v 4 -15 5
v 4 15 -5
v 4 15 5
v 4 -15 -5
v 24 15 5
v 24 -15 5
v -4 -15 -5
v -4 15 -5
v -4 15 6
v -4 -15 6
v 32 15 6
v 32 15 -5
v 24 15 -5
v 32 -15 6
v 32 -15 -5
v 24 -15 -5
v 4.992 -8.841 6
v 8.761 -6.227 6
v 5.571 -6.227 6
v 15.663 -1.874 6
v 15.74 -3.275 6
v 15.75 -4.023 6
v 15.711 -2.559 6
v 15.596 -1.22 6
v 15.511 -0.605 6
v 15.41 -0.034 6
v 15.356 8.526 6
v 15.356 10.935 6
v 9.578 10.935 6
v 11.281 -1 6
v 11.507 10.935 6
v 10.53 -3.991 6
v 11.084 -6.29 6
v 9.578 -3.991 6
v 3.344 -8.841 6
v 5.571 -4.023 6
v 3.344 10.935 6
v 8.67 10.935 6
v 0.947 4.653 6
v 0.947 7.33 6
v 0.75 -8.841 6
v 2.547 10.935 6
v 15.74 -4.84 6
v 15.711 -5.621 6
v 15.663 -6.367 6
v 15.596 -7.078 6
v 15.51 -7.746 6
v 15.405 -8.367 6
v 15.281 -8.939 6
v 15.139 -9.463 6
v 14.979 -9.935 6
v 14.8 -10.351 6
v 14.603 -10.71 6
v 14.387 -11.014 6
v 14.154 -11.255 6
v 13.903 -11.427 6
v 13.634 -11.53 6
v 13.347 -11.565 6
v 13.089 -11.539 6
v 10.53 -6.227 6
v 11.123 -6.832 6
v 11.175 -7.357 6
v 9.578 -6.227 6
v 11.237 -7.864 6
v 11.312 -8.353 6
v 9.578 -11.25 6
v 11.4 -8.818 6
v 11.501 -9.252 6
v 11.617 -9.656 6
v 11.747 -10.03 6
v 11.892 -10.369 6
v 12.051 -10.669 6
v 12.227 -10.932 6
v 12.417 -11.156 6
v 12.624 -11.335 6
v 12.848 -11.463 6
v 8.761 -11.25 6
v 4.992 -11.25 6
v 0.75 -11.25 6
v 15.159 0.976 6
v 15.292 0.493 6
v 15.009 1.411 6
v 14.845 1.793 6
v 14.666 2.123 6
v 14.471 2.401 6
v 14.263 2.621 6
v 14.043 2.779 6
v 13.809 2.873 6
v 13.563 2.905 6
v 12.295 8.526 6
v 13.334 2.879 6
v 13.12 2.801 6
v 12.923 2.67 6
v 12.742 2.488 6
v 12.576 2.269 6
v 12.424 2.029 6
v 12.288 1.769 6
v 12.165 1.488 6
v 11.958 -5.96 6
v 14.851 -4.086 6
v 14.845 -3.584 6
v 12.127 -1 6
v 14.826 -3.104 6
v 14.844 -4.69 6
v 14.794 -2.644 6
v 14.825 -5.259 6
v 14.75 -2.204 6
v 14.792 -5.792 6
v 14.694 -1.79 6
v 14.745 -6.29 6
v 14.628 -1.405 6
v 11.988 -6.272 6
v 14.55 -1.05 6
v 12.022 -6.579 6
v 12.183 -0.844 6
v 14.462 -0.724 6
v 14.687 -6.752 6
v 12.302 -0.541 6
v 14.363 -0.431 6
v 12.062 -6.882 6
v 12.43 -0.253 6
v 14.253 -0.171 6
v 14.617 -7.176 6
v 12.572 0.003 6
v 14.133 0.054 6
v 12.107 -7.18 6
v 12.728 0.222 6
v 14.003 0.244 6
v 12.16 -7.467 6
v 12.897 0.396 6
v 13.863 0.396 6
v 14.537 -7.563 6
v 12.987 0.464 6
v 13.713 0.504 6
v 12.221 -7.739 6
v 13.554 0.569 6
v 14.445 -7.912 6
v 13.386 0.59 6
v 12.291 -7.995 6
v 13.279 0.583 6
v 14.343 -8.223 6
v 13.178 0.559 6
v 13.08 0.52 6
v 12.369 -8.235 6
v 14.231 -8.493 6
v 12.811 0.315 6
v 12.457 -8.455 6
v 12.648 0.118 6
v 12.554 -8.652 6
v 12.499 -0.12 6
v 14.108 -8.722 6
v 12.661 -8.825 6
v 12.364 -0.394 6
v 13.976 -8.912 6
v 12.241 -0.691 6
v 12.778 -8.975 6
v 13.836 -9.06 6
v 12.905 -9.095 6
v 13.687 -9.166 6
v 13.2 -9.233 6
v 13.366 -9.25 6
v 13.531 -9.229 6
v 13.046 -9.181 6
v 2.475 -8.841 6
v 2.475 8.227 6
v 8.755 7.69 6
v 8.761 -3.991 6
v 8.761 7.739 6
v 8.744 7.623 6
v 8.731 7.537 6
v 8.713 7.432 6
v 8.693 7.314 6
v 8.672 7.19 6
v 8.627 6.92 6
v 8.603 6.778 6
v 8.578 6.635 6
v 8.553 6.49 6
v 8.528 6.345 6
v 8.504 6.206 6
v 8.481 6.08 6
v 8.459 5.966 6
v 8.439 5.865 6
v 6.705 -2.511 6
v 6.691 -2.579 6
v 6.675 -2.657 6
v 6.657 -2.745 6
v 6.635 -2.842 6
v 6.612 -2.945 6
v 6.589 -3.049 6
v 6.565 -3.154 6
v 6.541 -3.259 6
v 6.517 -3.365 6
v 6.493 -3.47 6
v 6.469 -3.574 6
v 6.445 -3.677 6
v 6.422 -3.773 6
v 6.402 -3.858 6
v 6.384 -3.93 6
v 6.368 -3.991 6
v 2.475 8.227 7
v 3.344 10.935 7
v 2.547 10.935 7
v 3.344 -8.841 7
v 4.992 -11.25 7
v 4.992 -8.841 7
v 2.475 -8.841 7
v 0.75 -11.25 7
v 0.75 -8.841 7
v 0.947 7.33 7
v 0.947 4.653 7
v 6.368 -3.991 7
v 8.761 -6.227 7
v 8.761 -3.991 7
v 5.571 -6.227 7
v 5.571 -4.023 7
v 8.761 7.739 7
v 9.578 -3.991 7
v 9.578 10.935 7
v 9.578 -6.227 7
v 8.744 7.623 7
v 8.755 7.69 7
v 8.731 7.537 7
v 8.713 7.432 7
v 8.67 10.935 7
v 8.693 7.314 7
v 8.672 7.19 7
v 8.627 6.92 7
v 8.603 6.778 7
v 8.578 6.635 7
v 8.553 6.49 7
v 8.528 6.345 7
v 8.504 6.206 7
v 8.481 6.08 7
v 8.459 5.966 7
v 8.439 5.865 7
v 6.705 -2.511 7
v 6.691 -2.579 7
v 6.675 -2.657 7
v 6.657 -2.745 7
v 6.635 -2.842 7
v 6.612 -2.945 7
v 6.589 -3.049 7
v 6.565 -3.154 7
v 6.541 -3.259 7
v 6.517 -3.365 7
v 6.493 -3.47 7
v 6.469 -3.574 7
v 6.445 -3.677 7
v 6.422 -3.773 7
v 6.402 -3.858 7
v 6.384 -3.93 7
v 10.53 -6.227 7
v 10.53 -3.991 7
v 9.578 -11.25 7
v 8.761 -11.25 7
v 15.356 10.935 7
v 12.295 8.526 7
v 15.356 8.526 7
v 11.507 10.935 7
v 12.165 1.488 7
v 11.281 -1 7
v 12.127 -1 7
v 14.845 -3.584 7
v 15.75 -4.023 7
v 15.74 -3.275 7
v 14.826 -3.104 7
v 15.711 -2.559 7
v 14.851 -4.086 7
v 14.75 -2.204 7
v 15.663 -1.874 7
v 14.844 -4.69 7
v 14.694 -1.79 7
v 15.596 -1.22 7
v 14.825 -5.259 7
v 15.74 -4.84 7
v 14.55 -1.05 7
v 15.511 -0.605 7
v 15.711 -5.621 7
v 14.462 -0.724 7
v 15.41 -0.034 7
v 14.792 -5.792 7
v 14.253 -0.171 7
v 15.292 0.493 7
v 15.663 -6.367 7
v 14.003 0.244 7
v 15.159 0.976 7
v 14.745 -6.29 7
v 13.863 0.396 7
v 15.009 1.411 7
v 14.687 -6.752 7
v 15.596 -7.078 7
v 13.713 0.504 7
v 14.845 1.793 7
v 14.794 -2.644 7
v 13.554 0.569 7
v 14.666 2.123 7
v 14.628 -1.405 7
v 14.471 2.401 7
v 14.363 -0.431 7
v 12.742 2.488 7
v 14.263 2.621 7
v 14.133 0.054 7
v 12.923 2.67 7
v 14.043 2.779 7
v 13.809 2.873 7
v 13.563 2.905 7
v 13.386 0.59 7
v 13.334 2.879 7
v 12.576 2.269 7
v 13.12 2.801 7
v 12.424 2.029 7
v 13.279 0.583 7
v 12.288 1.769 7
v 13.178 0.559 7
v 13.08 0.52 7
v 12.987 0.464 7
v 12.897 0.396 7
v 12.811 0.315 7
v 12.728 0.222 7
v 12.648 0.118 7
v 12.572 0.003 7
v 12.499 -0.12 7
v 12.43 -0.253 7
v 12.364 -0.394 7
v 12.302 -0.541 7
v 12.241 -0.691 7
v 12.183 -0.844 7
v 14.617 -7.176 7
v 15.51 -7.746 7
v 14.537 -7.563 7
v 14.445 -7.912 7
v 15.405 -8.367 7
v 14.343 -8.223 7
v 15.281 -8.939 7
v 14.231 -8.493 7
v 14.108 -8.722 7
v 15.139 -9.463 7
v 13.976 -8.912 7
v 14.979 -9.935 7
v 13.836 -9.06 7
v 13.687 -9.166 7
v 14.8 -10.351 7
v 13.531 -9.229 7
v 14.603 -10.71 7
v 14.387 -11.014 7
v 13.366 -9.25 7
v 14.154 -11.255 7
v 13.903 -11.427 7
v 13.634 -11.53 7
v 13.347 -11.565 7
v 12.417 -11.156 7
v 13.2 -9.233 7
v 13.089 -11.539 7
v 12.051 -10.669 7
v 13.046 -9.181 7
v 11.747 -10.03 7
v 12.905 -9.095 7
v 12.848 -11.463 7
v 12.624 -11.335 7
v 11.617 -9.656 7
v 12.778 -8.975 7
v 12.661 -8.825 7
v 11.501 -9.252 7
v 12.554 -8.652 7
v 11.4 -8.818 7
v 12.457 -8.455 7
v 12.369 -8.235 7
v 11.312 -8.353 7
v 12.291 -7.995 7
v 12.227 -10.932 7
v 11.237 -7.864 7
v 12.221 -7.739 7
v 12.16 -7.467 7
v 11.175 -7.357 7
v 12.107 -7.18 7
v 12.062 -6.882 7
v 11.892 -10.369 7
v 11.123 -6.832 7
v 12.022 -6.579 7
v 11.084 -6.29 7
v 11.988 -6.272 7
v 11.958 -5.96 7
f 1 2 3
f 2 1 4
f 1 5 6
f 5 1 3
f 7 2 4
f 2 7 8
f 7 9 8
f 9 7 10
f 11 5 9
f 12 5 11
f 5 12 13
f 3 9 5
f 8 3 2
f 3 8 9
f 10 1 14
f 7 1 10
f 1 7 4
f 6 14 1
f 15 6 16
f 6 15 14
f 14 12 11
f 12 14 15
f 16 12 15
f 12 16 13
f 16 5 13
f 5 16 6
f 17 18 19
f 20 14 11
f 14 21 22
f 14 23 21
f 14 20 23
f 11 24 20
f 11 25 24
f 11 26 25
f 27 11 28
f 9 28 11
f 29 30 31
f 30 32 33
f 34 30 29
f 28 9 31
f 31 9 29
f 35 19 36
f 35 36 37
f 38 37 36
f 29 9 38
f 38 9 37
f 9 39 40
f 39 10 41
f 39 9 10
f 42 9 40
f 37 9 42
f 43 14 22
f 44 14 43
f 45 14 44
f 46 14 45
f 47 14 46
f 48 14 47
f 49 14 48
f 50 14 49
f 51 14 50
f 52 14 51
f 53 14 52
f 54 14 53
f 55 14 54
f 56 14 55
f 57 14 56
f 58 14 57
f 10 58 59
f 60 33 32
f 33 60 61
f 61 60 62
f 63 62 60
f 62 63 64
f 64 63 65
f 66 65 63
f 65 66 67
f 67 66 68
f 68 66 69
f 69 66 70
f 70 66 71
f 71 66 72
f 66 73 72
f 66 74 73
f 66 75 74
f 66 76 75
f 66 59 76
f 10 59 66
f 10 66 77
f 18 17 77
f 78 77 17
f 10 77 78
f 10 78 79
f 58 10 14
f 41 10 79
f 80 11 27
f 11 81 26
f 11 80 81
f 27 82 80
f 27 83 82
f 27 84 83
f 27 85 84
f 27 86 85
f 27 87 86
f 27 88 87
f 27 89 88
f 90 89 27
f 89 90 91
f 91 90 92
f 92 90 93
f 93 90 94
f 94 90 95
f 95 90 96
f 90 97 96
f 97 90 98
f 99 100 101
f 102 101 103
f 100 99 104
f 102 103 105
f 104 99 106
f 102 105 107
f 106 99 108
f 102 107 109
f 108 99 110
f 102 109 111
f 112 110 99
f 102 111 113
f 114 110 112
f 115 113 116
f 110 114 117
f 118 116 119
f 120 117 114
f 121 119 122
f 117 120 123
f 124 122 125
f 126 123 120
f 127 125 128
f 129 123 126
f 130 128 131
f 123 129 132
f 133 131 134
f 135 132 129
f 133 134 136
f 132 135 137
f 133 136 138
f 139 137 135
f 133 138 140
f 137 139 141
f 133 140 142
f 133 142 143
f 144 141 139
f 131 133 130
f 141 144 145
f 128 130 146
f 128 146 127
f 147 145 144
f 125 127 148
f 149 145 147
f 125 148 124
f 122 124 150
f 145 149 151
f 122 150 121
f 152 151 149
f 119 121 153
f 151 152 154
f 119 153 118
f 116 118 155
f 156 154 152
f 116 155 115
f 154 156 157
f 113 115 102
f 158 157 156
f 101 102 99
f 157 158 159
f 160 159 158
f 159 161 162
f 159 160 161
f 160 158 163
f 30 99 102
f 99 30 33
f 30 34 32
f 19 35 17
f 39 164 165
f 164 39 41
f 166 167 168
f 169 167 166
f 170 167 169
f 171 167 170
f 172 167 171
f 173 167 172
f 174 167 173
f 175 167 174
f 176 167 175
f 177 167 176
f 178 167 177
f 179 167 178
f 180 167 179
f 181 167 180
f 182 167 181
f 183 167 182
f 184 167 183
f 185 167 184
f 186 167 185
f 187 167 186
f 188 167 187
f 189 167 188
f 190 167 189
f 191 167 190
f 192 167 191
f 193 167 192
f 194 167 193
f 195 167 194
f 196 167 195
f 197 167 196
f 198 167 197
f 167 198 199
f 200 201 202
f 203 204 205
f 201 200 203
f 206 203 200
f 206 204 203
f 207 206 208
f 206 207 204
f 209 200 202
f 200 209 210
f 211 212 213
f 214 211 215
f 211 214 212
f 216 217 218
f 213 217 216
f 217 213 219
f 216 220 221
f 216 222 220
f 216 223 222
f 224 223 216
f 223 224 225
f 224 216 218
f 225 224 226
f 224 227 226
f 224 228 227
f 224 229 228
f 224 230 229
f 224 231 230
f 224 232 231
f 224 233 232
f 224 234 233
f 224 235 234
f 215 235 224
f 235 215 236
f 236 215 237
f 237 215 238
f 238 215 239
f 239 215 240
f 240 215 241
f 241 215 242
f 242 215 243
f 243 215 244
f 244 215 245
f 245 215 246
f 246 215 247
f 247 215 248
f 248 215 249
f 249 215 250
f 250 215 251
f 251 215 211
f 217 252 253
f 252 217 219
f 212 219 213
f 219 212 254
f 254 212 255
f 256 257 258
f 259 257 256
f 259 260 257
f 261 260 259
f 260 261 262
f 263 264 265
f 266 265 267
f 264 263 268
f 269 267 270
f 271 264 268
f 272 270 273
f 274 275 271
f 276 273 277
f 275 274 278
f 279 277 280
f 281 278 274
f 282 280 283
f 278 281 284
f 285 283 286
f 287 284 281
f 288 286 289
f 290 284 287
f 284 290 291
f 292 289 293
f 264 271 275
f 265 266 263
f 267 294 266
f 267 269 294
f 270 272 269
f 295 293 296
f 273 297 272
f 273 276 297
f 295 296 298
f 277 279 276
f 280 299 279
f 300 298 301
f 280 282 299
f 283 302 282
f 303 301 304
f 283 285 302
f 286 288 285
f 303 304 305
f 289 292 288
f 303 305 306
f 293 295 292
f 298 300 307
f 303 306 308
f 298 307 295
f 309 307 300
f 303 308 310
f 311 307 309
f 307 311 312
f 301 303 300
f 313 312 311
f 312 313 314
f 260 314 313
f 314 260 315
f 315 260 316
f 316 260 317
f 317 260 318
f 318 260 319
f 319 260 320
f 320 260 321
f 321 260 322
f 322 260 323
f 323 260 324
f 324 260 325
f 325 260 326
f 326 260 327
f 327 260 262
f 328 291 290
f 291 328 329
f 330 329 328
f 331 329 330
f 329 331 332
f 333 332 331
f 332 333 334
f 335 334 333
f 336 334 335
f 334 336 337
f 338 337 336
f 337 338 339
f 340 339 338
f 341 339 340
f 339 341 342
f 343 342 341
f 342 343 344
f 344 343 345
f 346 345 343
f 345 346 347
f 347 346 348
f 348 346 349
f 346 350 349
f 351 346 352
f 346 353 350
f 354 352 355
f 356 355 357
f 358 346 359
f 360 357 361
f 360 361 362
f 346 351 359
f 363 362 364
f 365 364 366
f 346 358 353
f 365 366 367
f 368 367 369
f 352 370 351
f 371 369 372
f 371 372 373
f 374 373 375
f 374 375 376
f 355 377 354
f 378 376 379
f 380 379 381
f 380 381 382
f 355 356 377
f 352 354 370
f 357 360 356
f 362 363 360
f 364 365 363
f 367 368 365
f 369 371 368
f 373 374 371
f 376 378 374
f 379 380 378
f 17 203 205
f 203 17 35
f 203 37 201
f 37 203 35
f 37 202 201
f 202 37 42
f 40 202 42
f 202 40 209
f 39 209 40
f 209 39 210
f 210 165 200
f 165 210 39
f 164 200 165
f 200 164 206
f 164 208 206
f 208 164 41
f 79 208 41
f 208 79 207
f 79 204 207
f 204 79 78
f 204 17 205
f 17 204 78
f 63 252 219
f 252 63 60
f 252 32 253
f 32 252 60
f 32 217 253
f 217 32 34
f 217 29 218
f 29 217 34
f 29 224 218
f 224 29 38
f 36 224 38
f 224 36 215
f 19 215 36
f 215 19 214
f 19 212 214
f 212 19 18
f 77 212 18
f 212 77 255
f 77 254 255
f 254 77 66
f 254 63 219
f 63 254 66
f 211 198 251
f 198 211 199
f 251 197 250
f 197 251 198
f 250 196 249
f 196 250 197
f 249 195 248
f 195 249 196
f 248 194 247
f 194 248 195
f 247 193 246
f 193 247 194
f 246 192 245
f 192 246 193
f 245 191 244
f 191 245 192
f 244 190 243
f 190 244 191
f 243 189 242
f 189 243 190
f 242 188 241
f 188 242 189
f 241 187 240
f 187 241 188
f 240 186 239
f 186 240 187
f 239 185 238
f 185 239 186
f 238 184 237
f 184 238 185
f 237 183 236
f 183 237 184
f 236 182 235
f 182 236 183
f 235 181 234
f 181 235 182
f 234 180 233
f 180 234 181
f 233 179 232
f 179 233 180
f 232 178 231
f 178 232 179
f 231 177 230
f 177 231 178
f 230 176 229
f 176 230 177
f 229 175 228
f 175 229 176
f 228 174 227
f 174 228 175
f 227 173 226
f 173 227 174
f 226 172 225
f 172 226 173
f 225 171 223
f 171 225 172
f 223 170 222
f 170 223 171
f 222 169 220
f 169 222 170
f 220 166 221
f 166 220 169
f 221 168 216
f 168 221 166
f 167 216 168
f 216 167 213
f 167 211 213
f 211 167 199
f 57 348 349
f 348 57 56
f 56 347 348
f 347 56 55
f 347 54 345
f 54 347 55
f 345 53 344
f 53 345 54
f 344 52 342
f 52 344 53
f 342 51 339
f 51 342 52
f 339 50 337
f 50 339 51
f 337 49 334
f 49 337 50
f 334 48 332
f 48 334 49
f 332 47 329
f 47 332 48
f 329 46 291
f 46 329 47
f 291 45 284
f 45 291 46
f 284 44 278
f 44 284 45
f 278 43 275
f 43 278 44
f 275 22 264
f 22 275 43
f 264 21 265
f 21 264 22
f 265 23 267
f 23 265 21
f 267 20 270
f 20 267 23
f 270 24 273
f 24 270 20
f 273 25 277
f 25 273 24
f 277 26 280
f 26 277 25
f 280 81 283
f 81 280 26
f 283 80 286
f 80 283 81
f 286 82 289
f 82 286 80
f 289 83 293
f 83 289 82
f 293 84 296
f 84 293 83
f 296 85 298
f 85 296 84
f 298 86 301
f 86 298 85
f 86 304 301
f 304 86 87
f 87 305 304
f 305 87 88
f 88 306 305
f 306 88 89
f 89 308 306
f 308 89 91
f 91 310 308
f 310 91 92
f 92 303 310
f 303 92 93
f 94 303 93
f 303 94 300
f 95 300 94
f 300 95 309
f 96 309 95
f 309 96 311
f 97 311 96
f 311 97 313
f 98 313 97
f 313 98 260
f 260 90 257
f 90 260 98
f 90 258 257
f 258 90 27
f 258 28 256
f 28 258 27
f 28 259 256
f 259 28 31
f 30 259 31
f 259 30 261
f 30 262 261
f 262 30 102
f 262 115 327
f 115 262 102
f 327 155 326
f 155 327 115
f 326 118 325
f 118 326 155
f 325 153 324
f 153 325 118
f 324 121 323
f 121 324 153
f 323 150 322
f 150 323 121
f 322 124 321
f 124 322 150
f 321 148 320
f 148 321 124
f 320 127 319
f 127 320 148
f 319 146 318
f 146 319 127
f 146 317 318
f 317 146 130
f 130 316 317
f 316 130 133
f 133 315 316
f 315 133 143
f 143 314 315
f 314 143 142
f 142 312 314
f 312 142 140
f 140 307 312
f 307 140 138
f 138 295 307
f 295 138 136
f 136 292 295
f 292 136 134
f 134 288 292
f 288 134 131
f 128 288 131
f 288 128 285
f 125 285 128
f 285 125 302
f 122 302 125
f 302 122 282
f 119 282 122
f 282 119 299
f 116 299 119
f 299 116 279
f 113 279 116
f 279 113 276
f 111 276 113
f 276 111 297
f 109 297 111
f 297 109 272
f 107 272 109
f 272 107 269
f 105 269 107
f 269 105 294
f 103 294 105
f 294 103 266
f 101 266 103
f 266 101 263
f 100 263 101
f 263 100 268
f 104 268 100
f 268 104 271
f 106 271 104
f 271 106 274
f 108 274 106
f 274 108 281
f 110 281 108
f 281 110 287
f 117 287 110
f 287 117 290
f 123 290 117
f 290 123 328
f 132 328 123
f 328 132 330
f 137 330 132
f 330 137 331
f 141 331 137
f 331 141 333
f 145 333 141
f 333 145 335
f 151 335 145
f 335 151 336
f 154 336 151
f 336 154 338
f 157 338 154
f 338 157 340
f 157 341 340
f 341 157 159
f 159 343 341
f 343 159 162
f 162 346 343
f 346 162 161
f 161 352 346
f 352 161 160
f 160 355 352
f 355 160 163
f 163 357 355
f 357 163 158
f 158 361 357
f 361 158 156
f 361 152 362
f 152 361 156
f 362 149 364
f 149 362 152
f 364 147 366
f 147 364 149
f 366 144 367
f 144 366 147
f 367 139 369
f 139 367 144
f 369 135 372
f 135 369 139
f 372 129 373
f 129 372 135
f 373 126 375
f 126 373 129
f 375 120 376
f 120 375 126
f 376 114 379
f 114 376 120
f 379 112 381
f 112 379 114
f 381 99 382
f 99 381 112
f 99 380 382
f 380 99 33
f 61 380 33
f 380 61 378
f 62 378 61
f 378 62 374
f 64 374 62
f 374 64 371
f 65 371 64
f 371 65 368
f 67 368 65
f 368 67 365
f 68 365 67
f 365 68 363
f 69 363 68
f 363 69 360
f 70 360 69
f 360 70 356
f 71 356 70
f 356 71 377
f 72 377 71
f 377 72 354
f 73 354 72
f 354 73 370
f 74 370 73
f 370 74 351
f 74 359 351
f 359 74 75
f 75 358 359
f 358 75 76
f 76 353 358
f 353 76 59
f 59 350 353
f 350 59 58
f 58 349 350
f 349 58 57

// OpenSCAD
module bridge(
    width = 25,
    length = 80
    ){
    
    //Do not modified these constants
    height = 10;
    base = 8;
    bridge_thick = 1;
    length_score = 5;
    width_score = 1.5;
    magic = 0.75; 
        
    cube([base,width,height],center=true);
    translate([length+base,0,0])cube([base,width,height],center=true);
    color("red") translate([length/2+base/2,0,height/2+bridge_thick/2])cube([length+2*base,width,bridge_thick],center=true);
       
    finalScore = (width * width_score) + (length * length_score);
    echo(str("Congratulation you received " , finalScore , " points"));
        
    mySize = (width > length) ? length : width;
    translate([0,-width/2*magic,height/2+bridge_thick])    resize([length*magic,width*magic,1]) linear_extrude(height = magic)text(str(finalScore), size=mySize/2);
}


bridge(30,20);
